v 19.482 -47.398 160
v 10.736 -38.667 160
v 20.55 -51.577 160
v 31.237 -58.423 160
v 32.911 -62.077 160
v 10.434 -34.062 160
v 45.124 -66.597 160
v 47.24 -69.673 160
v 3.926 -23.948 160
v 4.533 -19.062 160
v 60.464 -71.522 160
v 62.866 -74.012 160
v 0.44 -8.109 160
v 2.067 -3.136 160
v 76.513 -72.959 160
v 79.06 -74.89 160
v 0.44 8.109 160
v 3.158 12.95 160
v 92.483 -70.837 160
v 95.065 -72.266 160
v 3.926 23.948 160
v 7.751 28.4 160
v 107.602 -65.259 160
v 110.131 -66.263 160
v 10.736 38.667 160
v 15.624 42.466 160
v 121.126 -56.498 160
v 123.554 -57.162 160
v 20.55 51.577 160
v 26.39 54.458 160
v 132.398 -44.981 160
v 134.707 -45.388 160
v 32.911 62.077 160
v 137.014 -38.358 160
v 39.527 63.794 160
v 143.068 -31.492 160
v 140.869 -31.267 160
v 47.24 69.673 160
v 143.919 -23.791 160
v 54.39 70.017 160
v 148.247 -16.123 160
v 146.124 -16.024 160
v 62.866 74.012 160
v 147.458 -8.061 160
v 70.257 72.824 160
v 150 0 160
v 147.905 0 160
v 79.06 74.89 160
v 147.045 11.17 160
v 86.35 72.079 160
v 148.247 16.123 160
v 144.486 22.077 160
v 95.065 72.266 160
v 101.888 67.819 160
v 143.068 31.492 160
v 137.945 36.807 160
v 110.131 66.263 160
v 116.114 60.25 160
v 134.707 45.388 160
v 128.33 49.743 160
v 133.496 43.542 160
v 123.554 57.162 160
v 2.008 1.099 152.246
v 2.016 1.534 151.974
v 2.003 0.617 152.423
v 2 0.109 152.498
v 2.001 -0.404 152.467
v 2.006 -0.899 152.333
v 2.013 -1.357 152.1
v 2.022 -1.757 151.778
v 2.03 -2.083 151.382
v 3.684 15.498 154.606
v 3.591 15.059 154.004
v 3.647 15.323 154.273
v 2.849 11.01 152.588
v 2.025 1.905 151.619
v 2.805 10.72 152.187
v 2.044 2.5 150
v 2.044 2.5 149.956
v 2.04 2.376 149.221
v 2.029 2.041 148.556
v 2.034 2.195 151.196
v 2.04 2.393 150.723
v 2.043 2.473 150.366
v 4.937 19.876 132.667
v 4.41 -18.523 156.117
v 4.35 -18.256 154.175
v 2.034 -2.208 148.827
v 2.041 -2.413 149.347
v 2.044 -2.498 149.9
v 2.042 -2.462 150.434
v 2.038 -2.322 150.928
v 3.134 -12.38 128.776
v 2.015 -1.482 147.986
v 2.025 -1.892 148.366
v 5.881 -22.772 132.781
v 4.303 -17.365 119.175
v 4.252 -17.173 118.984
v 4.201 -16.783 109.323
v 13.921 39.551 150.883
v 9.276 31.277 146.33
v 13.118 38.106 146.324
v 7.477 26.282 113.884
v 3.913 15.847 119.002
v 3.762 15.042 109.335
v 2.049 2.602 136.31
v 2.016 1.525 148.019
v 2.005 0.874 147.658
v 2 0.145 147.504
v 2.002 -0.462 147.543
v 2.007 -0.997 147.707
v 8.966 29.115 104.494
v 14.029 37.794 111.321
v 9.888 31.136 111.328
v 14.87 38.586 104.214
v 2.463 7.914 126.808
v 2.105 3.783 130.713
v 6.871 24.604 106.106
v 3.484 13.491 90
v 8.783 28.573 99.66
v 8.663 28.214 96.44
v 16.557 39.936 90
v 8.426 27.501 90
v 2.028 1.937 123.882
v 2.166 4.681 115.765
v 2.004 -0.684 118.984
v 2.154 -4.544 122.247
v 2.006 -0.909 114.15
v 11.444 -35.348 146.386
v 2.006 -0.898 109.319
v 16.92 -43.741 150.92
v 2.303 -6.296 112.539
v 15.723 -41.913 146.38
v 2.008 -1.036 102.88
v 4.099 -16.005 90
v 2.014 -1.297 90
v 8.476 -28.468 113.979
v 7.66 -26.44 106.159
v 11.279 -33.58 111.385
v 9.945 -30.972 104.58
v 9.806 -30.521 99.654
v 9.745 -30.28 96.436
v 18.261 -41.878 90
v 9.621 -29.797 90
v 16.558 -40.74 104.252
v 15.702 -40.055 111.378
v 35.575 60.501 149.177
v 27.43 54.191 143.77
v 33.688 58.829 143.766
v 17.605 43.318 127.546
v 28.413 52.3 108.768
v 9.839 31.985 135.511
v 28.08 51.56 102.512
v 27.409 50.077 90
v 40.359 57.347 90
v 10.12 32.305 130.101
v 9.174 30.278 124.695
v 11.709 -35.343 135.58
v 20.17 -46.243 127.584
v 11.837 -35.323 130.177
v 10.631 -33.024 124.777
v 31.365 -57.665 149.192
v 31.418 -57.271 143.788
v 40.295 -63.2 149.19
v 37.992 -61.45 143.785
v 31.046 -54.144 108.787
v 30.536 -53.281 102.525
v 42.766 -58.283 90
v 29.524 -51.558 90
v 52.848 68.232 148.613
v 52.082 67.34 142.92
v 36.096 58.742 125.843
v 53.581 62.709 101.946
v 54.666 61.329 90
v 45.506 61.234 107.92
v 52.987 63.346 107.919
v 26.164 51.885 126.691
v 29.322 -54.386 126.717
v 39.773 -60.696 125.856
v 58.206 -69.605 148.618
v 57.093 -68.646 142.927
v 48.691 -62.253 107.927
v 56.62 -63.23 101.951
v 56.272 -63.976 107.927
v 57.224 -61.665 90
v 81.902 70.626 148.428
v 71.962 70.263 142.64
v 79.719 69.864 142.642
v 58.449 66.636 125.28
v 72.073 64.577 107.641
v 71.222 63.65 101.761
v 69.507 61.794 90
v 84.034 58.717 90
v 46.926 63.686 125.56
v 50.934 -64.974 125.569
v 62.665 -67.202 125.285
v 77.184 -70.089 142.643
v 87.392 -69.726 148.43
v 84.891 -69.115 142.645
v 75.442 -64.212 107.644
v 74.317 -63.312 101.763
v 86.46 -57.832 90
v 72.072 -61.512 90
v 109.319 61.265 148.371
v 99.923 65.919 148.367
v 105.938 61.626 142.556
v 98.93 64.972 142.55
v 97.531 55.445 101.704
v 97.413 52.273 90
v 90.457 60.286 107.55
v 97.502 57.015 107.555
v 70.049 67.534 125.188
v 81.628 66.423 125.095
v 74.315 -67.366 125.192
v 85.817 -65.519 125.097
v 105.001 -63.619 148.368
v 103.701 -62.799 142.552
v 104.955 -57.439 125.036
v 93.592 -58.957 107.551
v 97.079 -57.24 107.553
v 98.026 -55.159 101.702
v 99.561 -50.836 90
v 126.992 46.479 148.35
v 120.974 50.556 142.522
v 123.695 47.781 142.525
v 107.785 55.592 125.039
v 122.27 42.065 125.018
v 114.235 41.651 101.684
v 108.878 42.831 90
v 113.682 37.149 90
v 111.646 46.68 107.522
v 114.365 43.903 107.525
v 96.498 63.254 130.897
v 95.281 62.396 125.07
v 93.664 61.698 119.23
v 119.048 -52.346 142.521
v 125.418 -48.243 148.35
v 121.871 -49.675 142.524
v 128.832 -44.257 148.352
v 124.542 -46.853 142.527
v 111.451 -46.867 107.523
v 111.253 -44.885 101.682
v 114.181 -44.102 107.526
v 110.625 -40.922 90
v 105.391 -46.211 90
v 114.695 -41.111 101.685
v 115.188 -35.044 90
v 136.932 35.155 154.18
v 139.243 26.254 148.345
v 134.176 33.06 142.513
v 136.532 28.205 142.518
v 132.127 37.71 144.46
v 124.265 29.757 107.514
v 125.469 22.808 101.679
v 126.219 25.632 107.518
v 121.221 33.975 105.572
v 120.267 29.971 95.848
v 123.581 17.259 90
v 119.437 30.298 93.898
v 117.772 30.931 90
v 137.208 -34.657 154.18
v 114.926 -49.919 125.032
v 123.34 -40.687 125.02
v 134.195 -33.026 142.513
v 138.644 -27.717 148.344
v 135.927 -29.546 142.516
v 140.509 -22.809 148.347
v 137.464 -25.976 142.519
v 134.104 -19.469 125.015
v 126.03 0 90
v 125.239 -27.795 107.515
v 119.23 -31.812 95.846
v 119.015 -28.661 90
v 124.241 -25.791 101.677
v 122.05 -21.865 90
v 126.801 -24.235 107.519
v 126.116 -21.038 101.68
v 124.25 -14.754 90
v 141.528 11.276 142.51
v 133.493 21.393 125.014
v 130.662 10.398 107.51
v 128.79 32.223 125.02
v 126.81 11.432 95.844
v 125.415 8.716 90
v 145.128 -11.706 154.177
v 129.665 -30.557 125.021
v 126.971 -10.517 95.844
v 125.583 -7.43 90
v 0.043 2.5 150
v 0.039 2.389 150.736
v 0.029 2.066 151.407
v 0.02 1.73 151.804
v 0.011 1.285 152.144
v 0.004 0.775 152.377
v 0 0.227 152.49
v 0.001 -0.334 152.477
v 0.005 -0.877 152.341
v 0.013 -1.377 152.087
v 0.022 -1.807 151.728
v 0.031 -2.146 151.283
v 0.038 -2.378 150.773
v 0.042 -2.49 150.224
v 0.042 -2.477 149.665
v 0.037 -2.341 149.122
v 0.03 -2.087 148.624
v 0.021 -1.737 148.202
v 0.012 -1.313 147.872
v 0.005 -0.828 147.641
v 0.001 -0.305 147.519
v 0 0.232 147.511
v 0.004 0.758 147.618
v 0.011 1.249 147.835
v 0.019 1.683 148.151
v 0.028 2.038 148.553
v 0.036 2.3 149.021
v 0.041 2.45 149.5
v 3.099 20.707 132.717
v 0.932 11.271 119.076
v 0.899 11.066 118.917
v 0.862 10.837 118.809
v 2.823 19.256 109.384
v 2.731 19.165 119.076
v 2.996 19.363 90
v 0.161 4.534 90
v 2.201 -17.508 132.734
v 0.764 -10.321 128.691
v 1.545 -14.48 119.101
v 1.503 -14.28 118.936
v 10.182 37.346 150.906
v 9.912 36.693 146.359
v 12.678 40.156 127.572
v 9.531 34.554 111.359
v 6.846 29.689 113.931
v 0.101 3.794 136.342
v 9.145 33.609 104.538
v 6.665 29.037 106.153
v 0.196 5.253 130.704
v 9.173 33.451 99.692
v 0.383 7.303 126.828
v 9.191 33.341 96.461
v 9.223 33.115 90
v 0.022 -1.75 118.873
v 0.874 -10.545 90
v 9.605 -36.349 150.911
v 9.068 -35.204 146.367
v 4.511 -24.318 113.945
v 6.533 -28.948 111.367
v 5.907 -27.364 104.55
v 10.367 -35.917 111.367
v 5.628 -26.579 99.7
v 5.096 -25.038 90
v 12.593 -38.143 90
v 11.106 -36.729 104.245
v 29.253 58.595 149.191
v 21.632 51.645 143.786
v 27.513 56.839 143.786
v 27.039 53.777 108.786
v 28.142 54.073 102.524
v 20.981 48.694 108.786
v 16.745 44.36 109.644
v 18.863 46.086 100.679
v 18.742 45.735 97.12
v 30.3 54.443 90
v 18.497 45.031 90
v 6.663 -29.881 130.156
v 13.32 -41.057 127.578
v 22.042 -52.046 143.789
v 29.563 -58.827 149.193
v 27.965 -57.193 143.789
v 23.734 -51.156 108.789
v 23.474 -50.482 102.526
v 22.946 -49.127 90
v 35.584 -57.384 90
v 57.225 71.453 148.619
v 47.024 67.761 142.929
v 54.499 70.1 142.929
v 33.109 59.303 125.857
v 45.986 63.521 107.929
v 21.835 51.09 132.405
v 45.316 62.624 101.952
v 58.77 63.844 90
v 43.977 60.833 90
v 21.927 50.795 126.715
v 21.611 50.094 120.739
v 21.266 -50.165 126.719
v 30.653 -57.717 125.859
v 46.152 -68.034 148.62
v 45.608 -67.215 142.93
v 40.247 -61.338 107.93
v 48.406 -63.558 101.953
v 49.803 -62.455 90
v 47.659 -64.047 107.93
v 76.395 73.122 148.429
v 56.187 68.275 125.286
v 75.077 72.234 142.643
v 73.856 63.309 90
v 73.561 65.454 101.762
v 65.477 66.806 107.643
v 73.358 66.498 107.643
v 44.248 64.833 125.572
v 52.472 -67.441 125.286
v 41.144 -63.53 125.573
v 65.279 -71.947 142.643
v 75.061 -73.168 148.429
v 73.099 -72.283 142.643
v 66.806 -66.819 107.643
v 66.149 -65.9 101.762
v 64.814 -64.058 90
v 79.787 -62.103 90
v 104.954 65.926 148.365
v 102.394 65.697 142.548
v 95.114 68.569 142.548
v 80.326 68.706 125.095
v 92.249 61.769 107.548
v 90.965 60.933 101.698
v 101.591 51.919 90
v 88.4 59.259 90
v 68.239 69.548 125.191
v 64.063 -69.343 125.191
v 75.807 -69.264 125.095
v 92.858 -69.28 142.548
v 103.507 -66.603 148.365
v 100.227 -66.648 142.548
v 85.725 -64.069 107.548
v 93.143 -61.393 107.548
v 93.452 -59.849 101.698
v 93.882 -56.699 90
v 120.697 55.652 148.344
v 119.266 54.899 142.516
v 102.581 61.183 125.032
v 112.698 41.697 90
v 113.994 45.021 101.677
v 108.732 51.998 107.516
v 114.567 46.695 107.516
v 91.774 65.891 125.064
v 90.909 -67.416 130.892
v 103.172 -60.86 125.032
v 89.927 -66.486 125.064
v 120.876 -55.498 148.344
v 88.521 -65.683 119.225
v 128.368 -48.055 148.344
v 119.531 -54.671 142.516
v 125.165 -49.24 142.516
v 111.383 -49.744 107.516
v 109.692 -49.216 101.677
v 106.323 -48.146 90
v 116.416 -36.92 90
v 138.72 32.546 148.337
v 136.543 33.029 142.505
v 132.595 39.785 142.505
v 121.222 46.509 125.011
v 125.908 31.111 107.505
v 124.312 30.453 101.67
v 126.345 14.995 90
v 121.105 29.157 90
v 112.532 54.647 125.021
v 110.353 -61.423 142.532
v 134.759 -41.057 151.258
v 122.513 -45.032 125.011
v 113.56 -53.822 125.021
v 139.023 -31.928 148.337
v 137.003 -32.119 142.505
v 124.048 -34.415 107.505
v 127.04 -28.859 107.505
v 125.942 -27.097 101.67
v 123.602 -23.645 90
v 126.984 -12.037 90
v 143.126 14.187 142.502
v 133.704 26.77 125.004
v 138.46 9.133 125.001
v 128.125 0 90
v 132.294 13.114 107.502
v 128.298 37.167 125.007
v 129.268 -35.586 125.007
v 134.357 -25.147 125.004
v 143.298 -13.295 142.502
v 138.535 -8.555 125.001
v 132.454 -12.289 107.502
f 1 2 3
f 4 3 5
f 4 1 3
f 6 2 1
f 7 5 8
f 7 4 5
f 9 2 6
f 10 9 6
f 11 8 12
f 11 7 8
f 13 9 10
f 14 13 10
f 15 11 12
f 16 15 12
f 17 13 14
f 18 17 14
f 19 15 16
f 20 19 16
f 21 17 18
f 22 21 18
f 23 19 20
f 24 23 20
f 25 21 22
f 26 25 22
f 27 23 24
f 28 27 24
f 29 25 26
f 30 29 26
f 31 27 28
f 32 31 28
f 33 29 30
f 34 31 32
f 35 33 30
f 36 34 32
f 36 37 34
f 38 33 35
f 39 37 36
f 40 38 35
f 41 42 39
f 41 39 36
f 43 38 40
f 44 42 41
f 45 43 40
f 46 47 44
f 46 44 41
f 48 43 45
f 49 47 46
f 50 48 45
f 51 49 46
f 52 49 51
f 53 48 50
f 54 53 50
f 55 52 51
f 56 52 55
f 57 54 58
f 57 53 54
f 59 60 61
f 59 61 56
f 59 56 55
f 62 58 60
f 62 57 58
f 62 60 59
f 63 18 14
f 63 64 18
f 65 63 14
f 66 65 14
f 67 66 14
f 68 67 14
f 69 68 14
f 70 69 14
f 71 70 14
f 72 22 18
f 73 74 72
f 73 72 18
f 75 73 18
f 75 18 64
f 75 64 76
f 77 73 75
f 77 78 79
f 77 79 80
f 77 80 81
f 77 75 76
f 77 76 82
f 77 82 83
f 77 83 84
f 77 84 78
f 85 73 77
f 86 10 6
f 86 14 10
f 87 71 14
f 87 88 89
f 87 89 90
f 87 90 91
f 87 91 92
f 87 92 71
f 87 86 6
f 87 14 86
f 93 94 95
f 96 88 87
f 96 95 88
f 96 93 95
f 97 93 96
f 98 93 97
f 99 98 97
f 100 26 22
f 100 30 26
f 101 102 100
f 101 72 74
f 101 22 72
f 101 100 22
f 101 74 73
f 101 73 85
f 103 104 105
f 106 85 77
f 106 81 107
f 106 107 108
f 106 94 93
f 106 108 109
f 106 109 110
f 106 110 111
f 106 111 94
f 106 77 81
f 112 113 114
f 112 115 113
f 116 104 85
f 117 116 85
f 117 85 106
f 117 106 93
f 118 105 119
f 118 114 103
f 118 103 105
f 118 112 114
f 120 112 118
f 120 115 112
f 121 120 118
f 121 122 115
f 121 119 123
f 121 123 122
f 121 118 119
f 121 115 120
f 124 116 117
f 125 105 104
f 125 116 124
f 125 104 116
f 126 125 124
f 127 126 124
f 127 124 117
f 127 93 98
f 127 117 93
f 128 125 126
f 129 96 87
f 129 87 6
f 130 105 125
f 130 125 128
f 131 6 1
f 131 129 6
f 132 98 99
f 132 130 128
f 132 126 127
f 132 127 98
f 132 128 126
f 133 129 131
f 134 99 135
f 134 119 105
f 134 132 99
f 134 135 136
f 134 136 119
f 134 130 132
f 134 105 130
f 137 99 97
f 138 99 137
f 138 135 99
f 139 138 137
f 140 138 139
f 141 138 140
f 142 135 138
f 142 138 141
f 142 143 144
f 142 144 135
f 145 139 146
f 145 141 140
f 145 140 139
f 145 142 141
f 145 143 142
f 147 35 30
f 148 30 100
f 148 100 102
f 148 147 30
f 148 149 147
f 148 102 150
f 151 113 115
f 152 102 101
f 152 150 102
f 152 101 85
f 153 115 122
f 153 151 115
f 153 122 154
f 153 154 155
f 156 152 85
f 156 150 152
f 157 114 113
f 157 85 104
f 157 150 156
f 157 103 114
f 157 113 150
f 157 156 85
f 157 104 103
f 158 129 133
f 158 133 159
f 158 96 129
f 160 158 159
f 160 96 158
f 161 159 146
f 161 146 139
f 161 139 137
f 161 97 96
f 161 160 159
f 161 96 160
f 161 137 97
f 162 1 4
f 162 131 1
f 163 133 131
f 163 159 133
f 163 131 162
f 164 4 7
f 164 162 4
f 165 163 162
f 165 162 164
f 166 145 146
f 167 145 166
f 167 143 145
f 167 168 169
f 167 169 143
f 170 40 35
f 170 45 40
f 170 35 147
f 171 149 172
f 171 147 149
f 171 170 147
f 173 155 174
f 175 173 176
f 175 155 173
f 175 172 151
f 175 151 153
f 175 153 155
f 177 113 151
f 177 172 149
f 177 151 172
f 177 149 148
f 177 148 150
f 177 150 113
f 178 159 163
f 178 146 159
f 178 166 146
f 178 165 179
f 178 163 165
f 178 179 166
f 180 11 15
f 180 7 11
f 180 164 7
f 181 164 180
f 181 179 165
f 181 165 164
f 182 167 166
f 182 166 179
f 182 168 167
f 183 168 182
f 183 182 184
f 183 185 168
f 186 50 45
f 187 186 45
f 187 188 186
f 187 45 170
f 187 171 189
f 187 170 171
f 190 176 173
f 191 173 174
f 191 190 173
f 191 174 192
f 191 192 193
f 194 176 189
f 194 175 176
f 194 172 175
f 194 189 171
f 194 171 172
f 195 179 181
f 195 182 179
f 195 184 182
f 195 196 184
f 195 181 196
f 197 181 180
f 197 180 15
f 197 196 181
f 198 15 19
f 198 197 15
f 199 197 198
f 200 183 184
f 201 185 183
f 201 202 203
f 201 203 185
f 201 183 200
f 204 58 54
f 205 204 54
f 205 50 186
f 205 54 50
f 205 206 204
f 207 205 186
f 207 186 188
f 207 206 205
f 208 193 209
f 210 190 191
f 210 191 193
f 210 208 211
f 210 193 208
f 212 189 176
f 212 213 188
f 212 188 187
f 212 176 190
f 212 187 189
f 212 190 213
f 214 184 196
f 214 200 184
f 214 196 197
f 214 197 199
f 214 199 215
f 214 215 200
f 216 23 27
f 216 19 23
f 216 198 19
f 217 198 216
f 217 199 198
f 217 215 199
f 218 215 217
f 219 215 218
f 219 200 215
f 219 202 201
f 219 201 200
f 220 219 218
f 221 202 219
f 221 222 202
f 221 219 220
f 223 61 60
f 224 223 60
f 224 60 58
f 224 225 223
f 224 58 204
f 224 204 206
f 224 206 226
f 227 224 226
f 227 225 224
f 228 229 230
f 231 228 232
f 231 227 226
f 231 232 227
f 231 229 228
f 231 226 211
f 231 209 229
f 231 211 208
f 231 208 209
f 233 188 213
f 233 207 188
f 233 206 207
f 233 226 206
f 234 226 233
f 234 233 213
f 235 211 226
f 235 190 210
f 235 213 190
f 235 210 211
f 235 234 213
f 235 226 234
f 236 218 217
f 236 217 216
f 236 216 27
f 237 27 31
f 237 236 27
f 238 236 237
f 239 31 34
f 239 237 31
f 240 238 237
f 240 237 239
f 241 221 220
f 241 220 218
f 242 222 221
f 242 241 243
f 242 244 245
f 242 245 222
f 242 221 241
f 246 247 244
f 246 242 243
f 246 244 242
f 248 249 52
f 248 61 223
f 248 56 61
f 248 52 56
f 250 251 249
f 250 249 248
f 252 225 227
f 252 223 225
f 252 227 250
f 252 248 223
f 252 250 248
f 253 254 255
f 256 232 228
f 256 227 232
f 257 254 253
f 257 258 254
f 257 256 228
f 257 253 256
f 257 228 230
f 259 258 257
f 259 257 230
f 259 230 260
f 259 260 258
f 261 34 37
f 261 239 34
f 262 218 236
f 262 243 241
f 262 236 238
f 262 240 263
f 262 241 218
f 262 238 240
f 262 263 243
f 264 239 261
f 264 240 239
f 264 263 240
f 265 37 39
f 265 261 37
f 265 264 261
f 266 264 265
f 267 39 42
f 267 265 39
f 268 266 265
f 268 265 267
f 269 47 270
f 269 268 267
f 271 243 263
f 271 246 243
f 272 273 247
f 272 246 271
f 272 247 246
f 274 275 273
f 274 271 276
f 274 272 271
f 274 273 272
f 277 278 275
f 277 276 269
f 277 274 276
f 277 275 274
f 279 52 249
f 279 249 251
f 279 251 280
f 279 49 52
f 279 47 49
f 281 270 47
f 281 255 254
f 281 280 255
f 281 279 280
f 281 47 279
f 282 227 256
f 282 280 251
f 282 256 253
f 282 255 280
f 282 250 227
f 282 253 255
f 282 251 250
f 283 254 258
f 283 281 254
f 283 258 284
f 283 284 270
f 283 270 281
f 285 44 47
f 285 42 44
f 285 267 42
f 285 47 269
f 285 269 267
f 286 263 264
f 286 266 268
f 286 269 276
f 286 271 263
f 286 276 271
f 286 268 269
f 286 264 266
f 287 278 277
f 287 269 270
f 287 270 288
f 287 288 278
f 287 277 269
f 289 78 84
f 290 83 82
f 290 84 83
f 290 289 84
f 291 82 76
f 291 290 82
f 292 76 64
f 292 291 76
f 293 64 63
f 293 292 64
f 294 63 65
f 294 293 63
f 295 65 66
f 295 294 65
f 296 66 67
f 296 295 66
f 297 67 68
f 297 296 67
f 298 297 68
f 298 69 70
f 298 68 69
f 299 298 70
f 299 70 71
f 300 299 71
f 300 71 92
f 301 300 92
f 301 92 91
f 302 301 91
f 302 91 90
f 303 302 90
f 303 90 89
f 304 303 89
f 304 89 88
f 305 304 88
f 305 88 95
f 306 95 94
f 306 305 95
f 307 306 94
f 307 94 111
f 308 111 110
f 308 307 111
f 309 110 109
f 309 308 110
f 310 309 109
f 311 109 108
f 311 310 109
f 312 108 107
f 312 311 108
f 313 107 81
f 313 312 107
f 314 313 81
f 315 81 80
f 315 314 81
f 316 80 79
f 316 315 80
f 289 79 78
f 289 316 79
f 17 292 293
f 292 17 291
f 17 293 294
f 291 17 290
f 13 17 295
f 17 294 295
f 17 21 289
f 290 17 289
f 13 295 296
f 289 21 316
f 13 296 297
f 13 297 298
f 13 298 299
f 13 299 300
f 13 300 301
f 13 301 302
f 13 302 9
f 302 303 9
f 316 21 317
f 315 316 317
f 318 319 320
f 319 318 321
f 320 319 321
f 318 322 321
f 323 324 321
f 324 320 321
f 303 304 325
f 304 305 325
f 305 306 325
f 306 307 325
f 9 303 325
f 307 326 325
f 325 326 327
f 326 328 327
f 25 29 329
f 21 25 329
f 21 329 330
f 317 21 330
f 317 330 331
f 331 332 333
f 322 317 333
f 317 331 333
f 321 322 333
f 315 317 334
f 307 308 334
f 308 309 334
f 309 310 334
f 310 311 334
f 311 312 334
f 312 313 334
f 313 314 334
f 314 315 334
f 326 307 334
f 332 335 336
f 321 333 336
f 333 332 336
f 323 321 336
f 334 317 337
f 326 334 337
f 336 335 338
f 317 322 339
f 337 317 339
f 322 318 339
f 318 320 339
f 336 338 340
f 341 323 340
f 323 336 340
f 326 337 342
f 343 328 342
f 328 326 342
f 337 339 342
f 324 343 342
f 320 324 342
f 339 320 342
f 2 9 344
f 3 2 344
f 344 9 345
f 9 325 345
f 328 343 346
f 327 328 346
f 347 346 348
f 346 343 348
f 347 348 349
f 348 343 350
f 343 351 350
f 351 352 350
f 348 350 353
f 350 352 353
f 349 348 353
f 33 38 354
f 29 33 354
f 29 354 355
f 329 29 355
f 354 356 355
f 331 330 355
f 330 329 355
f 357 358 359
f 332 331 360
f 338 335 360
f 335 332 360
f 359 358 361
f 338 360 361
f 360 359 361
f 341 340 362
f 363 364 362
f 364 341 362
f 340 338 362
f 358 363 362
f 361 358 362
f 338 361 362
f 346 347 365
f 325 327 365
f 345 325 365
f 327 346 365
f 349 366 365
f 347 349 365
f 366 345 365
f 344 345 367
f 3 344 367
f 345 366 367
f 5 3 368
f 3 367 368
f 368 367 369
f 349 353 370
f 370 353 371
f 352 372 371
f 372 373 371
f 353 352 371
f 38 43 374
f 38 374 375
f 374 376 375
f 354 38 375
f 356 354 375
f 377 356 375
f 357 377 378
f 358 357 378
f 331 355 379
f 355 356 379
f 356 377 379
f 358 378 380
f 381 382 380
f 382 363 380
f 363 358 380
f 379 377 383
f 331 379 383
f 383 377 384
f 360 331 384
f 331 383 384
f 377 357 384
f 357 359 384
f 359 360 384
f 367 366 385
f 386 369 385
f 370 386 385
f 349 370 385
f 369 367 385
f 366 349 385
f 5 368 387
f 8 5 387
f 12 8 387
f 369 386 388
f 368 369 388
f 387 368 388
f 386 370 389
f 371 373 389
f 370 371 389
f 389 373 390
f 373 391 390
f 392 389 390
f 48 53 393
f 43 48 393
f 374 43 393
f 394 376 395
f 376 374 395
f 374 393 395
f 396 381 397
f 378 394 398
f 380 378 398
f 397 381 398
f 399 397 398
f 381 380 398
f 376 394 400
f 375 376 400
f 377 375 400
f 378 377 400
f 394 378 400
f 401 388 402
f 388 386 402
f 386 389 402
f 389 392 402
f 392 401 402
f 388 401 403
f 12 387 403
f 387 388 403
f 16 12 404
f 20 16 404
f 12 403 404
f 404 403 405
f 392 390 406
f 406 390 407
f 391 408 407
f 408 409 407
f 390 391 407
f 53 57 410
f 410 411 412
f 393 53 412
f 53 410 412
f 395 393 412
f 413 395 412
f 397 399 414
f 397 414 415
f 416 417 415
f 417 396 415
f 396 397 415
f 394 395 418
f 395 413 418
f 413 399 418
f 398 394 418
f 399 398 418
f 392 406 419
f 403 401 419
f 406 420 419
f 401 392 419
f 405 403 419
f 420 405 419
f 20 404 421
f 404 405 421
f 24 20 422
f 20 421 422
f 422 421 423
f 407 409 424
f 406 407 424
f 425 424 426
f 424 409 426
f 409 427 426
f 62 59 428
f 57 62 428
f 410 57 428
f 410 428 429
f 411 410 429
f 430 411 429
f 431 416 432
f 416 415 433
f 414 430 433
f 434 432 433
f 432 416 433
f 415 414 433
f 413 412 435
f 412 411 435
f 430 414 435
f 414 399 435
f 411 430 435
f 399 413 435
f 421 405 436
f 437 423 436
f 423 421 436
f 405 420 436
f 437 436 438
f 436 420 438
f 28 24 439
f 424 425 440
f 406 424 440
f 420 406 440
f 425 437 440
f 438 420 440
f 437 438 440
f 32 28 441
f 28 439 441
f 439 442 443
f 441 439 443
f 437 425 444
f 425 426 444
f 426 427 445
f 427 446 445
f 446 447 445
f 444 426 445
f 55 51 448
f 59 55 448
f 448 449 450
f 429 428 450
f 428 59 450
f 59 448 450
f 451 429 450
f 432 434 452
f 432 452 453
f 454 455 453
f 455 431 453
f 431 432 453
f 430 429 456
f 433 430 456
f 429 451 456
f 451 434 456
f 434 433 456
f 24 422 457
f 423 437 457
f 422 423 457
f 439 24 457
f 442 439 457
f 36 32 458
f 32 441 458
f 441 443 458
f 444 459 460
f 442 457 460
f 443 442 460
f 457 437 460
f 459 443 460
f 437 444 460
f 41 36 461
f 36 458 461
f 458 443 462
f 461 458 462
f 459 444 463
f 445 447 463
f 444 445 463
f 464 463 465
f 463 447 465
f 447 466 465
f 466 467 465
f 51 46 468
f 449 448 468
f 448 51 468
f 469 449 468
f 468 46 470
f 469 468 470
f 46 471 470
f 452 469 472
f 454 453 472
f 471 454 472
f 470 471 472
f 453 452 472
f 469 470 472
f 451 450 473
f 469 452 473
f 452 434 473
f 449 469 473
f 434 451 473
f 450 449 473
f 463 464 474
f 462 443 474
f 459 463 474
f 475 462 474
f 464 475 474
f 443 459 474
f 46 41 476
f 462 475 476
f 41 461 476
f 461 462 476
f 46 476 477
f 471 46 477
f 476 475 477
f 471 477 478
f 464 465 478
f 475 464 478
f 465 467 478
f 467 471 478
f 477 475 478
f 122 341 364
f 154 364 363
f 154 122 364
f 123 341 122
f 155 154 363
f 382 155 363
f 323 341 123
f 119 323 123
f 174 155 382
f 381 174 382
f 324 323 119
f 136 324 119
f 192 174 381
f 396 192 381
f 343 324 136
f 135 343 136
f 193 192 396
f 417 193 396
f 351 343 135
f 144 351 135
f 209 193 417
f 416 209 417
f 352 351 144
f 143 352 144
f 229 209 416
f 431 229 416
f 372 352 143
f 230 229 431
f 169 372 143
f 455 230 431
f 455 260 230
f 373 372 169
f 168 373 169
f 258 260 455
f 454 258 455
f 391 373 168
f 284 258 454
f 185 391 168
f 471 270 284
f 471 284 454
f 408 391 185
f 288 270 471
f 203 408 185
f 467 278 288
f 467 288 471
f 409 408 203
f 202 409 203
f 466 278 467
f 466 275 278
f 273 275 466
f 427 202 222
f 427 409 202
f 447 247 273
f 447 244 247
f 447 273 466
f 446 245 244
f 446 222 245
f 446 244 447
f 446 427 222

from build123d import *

# Parameters (mm, degrees)
F2_R           = 75
F0_R           = 50
F4_T           = -2
F5_R           = 2.5
F6_DEPTH       = 2.0640929826
F8_D           = 15
F8_CBORE_D     = 97
F8_CBORE_DEPTH = 5
F9_W           = 200
F9_H           = 90
F10_DEPTH      = 100


with BuildPart() as f3:
    # F2 (on offset) → F3 section 0
    with BuildSketch(Plane.XY.offset(160)):
        with Locations((75, 0)):
            Circle(F2_R)
    # F0 (on Top) → F3 section 1
    with BuildSketch(Plane.XY):
        with Locations((50, 0)):
            Circle(F0_R)
    loft()

    # F4
    f4_openings = [f3.faces().sort_by_distance(p)[0] for p in [
        (75, 0, 160),
    ]]
    offset(amount=F4_T, openings=f4_openings)

    # F5 (on Right) → F6 (cut, through all)
    with BuildSketch(Plane.YZ):
        with Locations((0, 150)):
            Circle(F5_R)
        with Locations((0, 10)):
            Circle(F5_R)
    extrude(amount=F6_DEPTH, mode=Mode.SUBTRACT)

    # F8 (through all)
    with Locations(Plane(origin=(0, 0, 0), x_dir=(1, 0, 0), z_dir=(0, 0, -1))):
        with Locations((50, 0)):
            CounterBoreHole(F8_D / 2, F8_CBORE_D / 2, F8_CBORE_DEPTH)

    # F9 (on Front) → F10 (cut, symmetric)
    with BuildSketch(Plane.XZ):
        with Locations((100, 45)):
            Rectangle(F9_W, F9_H)
    extrude(amount=F10_DEPTH, both=True, mode=Mode.SUBTRACT)


solid = f3.part
